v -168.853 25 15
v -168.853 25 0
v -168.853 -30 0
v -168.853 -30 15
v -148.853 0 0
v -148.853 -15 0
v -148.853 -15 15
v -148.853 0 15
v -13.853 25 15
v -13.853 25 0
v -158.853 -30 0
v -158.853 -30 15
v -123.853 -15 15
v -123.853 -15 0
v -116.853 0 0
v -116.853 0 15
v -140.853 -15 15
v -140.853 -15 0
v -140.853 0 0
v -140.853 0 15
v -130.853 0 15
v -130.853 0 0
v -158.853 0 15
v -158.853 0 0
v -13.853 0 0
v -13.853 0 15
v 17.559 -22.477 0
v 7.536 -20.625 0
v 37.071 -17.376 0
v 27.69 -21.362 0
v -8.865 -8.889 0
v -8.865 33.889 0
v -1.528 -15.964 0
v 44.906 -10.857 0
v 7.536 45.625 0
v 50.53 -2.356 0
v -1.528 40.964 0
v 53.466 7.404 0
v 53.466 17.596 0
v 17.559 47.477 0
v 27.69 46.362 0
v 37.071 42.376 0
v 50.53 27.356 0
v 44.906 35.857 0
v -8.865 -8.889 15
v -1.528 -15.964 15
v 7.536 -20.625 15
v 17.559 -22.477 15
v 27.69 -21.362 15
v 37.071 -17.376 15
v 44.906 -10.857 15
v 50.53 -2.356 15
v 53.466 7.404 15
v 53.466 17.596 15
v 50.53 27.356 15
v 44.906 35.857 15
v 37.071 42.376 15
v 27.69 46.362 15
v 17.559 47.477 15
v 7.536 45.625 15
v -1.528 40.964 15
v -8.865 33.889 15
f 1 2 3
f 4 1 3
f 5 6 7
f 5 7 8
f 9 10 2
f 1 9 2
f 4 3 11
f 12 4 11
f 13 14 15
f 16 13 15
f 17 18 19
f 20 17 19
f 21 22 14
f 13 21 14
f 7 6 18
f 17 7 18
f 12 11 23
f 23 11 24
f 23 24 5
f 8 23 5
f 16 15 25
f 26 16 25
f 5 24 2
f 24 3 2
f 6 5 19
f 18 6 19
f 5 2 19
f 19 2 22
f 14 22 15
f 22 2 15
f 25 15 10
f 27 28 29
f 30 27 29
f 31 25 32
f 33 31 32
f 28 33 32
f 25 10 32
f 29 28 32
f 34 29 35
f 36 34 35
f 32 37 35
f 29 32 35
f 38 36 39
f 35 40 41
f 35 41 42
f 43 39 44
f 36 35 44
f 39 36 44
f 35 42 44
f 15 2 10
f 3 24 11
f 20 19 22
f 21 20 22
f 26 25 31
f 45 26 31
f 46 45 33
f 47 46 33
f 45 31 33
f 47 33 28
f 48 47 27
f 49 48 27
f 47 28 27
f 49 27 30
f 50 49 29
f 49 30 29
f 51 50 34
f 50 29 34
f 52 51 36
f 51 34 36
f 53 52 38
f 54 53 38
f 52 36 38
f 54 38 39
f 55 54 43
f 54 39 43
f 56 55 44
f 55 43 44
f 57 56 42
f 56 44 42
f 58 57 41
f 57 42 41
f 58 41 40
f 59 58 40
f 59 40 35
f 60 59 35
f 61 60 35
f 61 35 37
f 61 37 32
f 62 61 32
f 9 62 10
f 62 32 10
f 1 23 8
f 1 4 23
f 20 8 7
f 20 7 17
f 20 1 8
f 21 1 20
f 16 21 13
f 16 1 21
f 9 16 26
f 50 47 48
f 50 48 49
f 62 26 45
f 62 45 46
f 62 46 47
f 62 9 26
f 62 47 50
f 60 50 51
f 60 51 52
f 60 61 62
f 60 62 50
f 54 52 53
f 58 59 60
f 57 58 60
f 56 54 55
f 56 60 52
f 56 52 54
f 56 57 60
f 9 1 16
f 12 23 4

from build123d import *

# Parameters (mm, degrees)
F0_W     = 10
F0_H     = 30
F0_W_2   = 8
F0_H_2   = 15
F0_R     = 17.5
F1_DEPTH = 15


with BuildPart() as f1:
    # F0 (on Top) → F1 (new body)
    with BuildSketch(Plane.XY):
        Polygon((-13.852531, 0), (-13.852531, 25), (-168.852531, 25), (-168.852531, 0), (-158.852531, 0), (-148.852531, 0), (-140.852531, 0), (-130.852531, 0), (-123.852531, 0), (-116.852531, 0), align=None)
        with Locations((-163.852531, -15)):
            Rectangle(F0_W, F0_H)
        with Locations((-144.852531, -7.5)):
            Rectangle(F0_W_2, F0_H_2)
        Polygon((-123.852531, -15.00006), (-123.852531, 0), (-130.852531, 0), align=None)
        Polygon((-123.852531, -15.00006), (-116.852531, 0), (-123.852531, 0), align=None)
        with BuildLine():
            ThreePointArc((-13.852531, 0), (53.839211, 12.5), (-13.852531, 25))
            Line((-13.852531, 25), (-13.852531, 0))
        make_face()
        with Locations((18.839211, 12.5)):
            Circle(F0_R, mode=Mode.SUBTRACT)
        with Locations((18.839211, 12.5)):
            Circle(F0_R)
    extrude(amount=F1_DEPTH)


solid = f1.part
